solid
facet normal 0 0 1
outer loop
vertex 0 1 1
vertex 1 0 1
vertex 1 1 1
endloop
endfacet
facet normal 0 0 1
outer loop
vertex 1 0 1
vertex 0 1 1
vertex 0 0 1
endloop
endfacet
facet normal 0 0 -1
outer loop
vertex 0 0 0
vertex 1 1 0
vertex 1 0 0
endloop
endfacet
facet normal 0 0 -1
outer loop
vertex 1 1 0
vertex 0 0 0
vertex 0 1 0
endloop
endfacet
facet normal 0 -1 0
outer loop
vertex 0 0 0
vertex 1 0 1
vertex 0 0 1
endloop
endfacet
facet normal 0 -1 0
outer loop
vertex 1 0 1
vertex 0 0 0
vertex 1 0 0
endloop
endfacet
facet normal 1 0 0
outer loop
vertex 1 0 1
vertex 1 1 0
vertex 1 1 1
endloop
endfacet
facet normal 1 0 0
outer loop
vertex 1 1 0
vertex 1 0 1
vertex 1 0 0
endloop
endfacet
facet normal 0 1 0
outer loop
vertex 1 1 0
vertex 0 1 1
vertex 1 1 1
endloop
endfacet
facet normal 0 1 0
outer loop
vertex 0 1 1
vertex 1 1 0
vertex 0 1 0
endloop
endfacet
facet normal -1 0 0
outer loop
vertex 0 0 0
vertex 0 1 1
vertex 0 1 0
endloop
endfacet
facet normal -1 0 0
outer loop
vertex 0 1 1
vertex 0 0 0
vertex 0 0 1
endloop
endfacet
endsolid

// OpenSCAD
// Mathematical operators

function submatrix_skip(A,ri,cj)=[for(i=[0:len(A)-1]) if(i!=ri) [for(j=[0:len(A[i])-1]) if(j!=cj) A[i][j] ] ];

A1=[ [1,0,0,0],[0,2,0,0],[0,0,3,0],[0,0,0,4] ];
echo(A1);
echo(A1+A1);
echo( submatrix_skip(A1,1,2) );

echo("sumv function:");
function sumv(v,i,s=0) = let(ve=v[i]) (i==s ? ve : ve + sumv(v,i-1,s));
echo(sumv([1,2,3,4,5],4,0));
echo(sumv(A1,4,0));

function det_2x2(A) = A[0][0]*A[1][1]-A[0][1]*A[1][0];
function det_nxn(A) = let(A_len=len(A)) (A_len>2)
    ?
        sumv([for(cj=[0:A_len-1]) A[0][cj] * pow(-1,cj) * det_nxn(submatrix_skip(A,0,cj)) ], A_len-1,0)
    :   
        det_2x2(A);
echo( det_nxn([[1,0],[0,1]]) );
echo( det_nxn(A1) );

function trace(A) = (len(A)>1)? A[0][0]+trace( submatrix_skip(A,0,0) ) : A[0][0];

echo( trace(A1) );

function identity(n) = [for(ri=[0:n-1]) [for(cj=[0:n-1]) (ri==cj)?1:0] ];

function powm(A,k) = (k>0)? A*powm(A,k-1) : identity(len(A));

echo(powm(A1,0));
echo(powm(A1,1));
echo(powm(A1,2));

// Characteristic Polynomial construction
function cp_Mk(M,k)=let(M_len=len(M)) (k<1)?M:( cp_Mk(M,k-1) - (1/k) * trace( cp_Mk(M,k-1) ) * identity(M_len) );

function cp_coeffs(M)=[for(k=[0:len(M)]) (k==0)?1:(-1/k)*trace(cp_Mk(M,k-1))];

function inverse_vec(M)= let(coeffs=cp_coeffs(M),M_len=len(M)) [ for(k=[0:M_len-1]) powm(M,M_len-k)*coeffs[k]/(-1)*coeffs[M_len] ];

function inverse(M) = sumv( inverse_vec(M), len(M), 0 );

echo("Characteristic Polynomial construction:");
echo( cp_Mk(A1,0) );
echo( cp_Mk(A1,1) );
echo( cp_coeffs(A1) );
echo( inverse_vec(identity(3)) );
echo( inverse(identity(3)) );

cube();
